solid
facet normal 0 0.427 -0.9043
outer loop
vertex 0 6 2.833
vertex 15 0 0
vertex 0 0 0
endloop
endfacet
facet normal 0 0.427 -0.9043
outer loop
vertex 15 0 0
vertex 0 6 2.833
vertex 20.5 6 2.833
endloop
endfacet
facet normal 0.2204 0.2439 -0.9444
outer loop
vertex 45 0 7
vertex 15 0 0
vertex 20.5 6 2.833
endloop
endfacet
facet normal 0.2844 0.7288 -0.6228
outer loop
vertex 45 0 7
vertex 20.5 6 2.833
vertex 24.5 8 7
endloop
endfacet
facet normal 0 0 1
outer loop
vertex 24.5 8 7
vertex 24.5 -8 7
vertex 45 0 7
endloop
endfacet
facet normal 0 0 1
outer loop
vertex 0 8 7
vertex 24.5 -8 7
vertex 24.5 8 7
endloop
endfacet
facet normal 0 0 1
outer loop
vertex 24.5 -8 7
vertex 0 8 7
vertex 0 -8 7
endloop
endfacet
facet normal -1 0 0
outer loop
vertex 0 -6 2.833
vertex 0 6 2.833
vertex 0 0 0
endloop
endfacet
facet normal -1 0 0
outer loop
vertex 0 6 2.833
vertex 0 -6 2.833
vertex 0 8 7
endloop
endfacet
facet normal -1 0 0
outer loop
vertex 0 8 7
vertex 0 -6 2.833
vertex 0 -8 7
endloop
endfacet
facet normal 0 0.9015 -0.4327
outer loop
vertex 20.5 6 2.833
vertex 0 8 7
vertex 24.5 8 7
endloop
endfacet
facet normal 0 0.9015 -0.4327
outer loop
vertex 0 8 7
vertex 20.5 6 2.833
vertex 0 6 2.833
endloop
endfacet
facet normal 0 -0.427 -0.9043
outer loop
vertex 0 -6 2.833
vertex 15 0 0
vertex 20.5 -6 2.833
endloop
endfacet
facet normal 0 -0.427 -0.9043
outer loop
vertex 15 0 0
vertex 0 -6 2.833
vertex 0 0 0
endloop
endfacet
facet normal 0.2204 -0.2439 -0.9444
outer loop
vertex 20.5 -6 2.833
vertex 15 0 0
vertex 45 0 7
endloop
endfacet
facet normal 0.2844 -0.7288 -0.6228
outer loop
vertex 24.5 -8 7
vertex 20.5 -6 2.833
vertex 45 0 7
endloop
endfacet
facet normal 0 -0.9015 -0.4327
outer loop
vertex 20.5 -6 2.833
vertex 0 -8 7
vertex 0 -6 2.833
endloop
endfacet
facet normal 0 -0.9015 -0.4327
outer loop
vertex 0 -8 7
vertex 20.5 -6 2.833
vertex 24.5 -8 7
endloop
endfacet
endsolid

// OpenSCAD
sirka = 8;
dlzka = 45;
vyska = 7;

CubePoints = [
  [  0,                0,           0 ],  //0
  [ dlzka/3,           0,           0 ],  //1
  [ dlzka/2-2, sirka/2+2, vyska/3+0.5 ],  //2
  [  0,        sirka/2+2, vyska/3+0.5 ],  //3
  [  0,                0,       vyska ],  //4
  [ dlzka,             0,       vyska ],  //5
  [ dlzka/2+2,     sirka,       vyska ],  //6
  [  0,            sirka,       vyska ],  //7
];
  
CubeFaces = [
  [0,1,2,3],
  [6,2,5],[5,2,1],
  [6,7,3,2],
  [7,6,5,4], //vrch
  [7,4,0,3], //zadna cast
  [4,5,1,0],  //spoj
];

for (face=[0:1:len(CubeFaces)-1]) {
    echo("face: ", face, CubeFaces[face], len(CubeFaces[face]));
    for(point=[0:1:len(CubeFaces[face])-1]){
        echo(CubePoints[CubeFaces[face][point]]);
    }
}

hrubka_priecky = 0.31;
sirka_priecky = 20;
vyska_priecky = 10;
dlzka_priecky = 50;
rozostup = 4;

trup();

if(false){
    projection(cut=true)
    {
        union(){
            translate([-8,20,-rozostup-0.001])
                rotate([90,0,0])
                    priecky(false);
            translate([-8,30,+rozostup-0.001])
                rotate([90,0,0])
                    priecky(false);
        }
    }

    projection(cut=true)
    {
        union(){
            translate([0,0,-0.001])
                rotate([0,-90,0])
                    priecky(true);
            translate([10,0,-10-0.001])
                rotate([0,-90,0])
                    priecky(true);
            translate([20,0,-20-0.001])
                rotate([0,-90,0])
                    priecky(true);
            translate([30,0,-30-0.001])
                rotate([0,-90,0])
                    priecky(true);
        }
    }
}

module priecky(vrchne){
    if(vrchne){
        intersection() {
            trup();
            difference(){
                priecne_priecky();
                intersection(){
                    pozdlzne_priecky();
                    vrch();
                }
            }
        }
    }

    if(!vrchne){
        intersection() {
            trup();
            difference(){
                pozdlzne_priecky();
                intersection(){
                    priecne_priecky();
                    difference(){
                        trup();
                        vrch();
                    }
                }
            }
        }
    }
}

module trup(){
    a = 0;
    union() {
        rotate([a,0,0])
            polyhedron( CubePoints, CubeFaces );
        mirror([0,1,0])
            rotate([a,0,0])
                polyhedron( CubePoints, CubeFaces );
    }
}

module vrch(){
    color("violet"){
        rotate([0,-4,0])
            translate([-5,-sirka_priecky/2,4])
                cube([dlzka_priecky,sirka_priecky,vyska_priecky]);
    }
}
module odlahcovaci_otvor(){
    hull(){
        angle = 82;
        r = 3.1;
        translate([5,0,vyska+2])
            rotate([0,angle,0])
                cylinder(40,r,r);
        translate([5,0,vyska-2])
            rotate([0,angle,0])
                cylinder(40,r,r);
    }
}

module priecne_priecky(){
    difference() 
    {
        translate([0,0, vyska_priecky/2-1]){
            color("blue"){
                translate([hrubka_priecky/2+0.001,0,0])
                    cube([hrubka_priecky,sirka_priecky,vyska_priecky], center=true);
                translate([10,0,0])
                    cube([hrubka_priecky,sirka_priecky,vyska_priecky], center=true);
                translate([20,0,0])
                    cube([hrubka_priecky,sirka_priecky,vyska_priecky], center=true);
                translate([30,0,0])
                    cube([hrubka_priecky,sirka_priecky,vyska_priecky], center=true);
            }
        }
        odlahcovaci_otvor();
    }
}

module pozdlzne_priecky() {
    translate([0,0, vyska_priecky/2-1]){
        color("red"){
            translate([dlzka_priecky/2-4,-rozostup,0])
                cube([dlzka_priecky,hrubka_priecky,vyska_priecky], center=true);
            translate([dlzka_priecky/2-4,+rozostup,0])
                cube([dlzka_priecky,hrubka_priecky,vyska_priecky], center=true);                
        }
    }
}
